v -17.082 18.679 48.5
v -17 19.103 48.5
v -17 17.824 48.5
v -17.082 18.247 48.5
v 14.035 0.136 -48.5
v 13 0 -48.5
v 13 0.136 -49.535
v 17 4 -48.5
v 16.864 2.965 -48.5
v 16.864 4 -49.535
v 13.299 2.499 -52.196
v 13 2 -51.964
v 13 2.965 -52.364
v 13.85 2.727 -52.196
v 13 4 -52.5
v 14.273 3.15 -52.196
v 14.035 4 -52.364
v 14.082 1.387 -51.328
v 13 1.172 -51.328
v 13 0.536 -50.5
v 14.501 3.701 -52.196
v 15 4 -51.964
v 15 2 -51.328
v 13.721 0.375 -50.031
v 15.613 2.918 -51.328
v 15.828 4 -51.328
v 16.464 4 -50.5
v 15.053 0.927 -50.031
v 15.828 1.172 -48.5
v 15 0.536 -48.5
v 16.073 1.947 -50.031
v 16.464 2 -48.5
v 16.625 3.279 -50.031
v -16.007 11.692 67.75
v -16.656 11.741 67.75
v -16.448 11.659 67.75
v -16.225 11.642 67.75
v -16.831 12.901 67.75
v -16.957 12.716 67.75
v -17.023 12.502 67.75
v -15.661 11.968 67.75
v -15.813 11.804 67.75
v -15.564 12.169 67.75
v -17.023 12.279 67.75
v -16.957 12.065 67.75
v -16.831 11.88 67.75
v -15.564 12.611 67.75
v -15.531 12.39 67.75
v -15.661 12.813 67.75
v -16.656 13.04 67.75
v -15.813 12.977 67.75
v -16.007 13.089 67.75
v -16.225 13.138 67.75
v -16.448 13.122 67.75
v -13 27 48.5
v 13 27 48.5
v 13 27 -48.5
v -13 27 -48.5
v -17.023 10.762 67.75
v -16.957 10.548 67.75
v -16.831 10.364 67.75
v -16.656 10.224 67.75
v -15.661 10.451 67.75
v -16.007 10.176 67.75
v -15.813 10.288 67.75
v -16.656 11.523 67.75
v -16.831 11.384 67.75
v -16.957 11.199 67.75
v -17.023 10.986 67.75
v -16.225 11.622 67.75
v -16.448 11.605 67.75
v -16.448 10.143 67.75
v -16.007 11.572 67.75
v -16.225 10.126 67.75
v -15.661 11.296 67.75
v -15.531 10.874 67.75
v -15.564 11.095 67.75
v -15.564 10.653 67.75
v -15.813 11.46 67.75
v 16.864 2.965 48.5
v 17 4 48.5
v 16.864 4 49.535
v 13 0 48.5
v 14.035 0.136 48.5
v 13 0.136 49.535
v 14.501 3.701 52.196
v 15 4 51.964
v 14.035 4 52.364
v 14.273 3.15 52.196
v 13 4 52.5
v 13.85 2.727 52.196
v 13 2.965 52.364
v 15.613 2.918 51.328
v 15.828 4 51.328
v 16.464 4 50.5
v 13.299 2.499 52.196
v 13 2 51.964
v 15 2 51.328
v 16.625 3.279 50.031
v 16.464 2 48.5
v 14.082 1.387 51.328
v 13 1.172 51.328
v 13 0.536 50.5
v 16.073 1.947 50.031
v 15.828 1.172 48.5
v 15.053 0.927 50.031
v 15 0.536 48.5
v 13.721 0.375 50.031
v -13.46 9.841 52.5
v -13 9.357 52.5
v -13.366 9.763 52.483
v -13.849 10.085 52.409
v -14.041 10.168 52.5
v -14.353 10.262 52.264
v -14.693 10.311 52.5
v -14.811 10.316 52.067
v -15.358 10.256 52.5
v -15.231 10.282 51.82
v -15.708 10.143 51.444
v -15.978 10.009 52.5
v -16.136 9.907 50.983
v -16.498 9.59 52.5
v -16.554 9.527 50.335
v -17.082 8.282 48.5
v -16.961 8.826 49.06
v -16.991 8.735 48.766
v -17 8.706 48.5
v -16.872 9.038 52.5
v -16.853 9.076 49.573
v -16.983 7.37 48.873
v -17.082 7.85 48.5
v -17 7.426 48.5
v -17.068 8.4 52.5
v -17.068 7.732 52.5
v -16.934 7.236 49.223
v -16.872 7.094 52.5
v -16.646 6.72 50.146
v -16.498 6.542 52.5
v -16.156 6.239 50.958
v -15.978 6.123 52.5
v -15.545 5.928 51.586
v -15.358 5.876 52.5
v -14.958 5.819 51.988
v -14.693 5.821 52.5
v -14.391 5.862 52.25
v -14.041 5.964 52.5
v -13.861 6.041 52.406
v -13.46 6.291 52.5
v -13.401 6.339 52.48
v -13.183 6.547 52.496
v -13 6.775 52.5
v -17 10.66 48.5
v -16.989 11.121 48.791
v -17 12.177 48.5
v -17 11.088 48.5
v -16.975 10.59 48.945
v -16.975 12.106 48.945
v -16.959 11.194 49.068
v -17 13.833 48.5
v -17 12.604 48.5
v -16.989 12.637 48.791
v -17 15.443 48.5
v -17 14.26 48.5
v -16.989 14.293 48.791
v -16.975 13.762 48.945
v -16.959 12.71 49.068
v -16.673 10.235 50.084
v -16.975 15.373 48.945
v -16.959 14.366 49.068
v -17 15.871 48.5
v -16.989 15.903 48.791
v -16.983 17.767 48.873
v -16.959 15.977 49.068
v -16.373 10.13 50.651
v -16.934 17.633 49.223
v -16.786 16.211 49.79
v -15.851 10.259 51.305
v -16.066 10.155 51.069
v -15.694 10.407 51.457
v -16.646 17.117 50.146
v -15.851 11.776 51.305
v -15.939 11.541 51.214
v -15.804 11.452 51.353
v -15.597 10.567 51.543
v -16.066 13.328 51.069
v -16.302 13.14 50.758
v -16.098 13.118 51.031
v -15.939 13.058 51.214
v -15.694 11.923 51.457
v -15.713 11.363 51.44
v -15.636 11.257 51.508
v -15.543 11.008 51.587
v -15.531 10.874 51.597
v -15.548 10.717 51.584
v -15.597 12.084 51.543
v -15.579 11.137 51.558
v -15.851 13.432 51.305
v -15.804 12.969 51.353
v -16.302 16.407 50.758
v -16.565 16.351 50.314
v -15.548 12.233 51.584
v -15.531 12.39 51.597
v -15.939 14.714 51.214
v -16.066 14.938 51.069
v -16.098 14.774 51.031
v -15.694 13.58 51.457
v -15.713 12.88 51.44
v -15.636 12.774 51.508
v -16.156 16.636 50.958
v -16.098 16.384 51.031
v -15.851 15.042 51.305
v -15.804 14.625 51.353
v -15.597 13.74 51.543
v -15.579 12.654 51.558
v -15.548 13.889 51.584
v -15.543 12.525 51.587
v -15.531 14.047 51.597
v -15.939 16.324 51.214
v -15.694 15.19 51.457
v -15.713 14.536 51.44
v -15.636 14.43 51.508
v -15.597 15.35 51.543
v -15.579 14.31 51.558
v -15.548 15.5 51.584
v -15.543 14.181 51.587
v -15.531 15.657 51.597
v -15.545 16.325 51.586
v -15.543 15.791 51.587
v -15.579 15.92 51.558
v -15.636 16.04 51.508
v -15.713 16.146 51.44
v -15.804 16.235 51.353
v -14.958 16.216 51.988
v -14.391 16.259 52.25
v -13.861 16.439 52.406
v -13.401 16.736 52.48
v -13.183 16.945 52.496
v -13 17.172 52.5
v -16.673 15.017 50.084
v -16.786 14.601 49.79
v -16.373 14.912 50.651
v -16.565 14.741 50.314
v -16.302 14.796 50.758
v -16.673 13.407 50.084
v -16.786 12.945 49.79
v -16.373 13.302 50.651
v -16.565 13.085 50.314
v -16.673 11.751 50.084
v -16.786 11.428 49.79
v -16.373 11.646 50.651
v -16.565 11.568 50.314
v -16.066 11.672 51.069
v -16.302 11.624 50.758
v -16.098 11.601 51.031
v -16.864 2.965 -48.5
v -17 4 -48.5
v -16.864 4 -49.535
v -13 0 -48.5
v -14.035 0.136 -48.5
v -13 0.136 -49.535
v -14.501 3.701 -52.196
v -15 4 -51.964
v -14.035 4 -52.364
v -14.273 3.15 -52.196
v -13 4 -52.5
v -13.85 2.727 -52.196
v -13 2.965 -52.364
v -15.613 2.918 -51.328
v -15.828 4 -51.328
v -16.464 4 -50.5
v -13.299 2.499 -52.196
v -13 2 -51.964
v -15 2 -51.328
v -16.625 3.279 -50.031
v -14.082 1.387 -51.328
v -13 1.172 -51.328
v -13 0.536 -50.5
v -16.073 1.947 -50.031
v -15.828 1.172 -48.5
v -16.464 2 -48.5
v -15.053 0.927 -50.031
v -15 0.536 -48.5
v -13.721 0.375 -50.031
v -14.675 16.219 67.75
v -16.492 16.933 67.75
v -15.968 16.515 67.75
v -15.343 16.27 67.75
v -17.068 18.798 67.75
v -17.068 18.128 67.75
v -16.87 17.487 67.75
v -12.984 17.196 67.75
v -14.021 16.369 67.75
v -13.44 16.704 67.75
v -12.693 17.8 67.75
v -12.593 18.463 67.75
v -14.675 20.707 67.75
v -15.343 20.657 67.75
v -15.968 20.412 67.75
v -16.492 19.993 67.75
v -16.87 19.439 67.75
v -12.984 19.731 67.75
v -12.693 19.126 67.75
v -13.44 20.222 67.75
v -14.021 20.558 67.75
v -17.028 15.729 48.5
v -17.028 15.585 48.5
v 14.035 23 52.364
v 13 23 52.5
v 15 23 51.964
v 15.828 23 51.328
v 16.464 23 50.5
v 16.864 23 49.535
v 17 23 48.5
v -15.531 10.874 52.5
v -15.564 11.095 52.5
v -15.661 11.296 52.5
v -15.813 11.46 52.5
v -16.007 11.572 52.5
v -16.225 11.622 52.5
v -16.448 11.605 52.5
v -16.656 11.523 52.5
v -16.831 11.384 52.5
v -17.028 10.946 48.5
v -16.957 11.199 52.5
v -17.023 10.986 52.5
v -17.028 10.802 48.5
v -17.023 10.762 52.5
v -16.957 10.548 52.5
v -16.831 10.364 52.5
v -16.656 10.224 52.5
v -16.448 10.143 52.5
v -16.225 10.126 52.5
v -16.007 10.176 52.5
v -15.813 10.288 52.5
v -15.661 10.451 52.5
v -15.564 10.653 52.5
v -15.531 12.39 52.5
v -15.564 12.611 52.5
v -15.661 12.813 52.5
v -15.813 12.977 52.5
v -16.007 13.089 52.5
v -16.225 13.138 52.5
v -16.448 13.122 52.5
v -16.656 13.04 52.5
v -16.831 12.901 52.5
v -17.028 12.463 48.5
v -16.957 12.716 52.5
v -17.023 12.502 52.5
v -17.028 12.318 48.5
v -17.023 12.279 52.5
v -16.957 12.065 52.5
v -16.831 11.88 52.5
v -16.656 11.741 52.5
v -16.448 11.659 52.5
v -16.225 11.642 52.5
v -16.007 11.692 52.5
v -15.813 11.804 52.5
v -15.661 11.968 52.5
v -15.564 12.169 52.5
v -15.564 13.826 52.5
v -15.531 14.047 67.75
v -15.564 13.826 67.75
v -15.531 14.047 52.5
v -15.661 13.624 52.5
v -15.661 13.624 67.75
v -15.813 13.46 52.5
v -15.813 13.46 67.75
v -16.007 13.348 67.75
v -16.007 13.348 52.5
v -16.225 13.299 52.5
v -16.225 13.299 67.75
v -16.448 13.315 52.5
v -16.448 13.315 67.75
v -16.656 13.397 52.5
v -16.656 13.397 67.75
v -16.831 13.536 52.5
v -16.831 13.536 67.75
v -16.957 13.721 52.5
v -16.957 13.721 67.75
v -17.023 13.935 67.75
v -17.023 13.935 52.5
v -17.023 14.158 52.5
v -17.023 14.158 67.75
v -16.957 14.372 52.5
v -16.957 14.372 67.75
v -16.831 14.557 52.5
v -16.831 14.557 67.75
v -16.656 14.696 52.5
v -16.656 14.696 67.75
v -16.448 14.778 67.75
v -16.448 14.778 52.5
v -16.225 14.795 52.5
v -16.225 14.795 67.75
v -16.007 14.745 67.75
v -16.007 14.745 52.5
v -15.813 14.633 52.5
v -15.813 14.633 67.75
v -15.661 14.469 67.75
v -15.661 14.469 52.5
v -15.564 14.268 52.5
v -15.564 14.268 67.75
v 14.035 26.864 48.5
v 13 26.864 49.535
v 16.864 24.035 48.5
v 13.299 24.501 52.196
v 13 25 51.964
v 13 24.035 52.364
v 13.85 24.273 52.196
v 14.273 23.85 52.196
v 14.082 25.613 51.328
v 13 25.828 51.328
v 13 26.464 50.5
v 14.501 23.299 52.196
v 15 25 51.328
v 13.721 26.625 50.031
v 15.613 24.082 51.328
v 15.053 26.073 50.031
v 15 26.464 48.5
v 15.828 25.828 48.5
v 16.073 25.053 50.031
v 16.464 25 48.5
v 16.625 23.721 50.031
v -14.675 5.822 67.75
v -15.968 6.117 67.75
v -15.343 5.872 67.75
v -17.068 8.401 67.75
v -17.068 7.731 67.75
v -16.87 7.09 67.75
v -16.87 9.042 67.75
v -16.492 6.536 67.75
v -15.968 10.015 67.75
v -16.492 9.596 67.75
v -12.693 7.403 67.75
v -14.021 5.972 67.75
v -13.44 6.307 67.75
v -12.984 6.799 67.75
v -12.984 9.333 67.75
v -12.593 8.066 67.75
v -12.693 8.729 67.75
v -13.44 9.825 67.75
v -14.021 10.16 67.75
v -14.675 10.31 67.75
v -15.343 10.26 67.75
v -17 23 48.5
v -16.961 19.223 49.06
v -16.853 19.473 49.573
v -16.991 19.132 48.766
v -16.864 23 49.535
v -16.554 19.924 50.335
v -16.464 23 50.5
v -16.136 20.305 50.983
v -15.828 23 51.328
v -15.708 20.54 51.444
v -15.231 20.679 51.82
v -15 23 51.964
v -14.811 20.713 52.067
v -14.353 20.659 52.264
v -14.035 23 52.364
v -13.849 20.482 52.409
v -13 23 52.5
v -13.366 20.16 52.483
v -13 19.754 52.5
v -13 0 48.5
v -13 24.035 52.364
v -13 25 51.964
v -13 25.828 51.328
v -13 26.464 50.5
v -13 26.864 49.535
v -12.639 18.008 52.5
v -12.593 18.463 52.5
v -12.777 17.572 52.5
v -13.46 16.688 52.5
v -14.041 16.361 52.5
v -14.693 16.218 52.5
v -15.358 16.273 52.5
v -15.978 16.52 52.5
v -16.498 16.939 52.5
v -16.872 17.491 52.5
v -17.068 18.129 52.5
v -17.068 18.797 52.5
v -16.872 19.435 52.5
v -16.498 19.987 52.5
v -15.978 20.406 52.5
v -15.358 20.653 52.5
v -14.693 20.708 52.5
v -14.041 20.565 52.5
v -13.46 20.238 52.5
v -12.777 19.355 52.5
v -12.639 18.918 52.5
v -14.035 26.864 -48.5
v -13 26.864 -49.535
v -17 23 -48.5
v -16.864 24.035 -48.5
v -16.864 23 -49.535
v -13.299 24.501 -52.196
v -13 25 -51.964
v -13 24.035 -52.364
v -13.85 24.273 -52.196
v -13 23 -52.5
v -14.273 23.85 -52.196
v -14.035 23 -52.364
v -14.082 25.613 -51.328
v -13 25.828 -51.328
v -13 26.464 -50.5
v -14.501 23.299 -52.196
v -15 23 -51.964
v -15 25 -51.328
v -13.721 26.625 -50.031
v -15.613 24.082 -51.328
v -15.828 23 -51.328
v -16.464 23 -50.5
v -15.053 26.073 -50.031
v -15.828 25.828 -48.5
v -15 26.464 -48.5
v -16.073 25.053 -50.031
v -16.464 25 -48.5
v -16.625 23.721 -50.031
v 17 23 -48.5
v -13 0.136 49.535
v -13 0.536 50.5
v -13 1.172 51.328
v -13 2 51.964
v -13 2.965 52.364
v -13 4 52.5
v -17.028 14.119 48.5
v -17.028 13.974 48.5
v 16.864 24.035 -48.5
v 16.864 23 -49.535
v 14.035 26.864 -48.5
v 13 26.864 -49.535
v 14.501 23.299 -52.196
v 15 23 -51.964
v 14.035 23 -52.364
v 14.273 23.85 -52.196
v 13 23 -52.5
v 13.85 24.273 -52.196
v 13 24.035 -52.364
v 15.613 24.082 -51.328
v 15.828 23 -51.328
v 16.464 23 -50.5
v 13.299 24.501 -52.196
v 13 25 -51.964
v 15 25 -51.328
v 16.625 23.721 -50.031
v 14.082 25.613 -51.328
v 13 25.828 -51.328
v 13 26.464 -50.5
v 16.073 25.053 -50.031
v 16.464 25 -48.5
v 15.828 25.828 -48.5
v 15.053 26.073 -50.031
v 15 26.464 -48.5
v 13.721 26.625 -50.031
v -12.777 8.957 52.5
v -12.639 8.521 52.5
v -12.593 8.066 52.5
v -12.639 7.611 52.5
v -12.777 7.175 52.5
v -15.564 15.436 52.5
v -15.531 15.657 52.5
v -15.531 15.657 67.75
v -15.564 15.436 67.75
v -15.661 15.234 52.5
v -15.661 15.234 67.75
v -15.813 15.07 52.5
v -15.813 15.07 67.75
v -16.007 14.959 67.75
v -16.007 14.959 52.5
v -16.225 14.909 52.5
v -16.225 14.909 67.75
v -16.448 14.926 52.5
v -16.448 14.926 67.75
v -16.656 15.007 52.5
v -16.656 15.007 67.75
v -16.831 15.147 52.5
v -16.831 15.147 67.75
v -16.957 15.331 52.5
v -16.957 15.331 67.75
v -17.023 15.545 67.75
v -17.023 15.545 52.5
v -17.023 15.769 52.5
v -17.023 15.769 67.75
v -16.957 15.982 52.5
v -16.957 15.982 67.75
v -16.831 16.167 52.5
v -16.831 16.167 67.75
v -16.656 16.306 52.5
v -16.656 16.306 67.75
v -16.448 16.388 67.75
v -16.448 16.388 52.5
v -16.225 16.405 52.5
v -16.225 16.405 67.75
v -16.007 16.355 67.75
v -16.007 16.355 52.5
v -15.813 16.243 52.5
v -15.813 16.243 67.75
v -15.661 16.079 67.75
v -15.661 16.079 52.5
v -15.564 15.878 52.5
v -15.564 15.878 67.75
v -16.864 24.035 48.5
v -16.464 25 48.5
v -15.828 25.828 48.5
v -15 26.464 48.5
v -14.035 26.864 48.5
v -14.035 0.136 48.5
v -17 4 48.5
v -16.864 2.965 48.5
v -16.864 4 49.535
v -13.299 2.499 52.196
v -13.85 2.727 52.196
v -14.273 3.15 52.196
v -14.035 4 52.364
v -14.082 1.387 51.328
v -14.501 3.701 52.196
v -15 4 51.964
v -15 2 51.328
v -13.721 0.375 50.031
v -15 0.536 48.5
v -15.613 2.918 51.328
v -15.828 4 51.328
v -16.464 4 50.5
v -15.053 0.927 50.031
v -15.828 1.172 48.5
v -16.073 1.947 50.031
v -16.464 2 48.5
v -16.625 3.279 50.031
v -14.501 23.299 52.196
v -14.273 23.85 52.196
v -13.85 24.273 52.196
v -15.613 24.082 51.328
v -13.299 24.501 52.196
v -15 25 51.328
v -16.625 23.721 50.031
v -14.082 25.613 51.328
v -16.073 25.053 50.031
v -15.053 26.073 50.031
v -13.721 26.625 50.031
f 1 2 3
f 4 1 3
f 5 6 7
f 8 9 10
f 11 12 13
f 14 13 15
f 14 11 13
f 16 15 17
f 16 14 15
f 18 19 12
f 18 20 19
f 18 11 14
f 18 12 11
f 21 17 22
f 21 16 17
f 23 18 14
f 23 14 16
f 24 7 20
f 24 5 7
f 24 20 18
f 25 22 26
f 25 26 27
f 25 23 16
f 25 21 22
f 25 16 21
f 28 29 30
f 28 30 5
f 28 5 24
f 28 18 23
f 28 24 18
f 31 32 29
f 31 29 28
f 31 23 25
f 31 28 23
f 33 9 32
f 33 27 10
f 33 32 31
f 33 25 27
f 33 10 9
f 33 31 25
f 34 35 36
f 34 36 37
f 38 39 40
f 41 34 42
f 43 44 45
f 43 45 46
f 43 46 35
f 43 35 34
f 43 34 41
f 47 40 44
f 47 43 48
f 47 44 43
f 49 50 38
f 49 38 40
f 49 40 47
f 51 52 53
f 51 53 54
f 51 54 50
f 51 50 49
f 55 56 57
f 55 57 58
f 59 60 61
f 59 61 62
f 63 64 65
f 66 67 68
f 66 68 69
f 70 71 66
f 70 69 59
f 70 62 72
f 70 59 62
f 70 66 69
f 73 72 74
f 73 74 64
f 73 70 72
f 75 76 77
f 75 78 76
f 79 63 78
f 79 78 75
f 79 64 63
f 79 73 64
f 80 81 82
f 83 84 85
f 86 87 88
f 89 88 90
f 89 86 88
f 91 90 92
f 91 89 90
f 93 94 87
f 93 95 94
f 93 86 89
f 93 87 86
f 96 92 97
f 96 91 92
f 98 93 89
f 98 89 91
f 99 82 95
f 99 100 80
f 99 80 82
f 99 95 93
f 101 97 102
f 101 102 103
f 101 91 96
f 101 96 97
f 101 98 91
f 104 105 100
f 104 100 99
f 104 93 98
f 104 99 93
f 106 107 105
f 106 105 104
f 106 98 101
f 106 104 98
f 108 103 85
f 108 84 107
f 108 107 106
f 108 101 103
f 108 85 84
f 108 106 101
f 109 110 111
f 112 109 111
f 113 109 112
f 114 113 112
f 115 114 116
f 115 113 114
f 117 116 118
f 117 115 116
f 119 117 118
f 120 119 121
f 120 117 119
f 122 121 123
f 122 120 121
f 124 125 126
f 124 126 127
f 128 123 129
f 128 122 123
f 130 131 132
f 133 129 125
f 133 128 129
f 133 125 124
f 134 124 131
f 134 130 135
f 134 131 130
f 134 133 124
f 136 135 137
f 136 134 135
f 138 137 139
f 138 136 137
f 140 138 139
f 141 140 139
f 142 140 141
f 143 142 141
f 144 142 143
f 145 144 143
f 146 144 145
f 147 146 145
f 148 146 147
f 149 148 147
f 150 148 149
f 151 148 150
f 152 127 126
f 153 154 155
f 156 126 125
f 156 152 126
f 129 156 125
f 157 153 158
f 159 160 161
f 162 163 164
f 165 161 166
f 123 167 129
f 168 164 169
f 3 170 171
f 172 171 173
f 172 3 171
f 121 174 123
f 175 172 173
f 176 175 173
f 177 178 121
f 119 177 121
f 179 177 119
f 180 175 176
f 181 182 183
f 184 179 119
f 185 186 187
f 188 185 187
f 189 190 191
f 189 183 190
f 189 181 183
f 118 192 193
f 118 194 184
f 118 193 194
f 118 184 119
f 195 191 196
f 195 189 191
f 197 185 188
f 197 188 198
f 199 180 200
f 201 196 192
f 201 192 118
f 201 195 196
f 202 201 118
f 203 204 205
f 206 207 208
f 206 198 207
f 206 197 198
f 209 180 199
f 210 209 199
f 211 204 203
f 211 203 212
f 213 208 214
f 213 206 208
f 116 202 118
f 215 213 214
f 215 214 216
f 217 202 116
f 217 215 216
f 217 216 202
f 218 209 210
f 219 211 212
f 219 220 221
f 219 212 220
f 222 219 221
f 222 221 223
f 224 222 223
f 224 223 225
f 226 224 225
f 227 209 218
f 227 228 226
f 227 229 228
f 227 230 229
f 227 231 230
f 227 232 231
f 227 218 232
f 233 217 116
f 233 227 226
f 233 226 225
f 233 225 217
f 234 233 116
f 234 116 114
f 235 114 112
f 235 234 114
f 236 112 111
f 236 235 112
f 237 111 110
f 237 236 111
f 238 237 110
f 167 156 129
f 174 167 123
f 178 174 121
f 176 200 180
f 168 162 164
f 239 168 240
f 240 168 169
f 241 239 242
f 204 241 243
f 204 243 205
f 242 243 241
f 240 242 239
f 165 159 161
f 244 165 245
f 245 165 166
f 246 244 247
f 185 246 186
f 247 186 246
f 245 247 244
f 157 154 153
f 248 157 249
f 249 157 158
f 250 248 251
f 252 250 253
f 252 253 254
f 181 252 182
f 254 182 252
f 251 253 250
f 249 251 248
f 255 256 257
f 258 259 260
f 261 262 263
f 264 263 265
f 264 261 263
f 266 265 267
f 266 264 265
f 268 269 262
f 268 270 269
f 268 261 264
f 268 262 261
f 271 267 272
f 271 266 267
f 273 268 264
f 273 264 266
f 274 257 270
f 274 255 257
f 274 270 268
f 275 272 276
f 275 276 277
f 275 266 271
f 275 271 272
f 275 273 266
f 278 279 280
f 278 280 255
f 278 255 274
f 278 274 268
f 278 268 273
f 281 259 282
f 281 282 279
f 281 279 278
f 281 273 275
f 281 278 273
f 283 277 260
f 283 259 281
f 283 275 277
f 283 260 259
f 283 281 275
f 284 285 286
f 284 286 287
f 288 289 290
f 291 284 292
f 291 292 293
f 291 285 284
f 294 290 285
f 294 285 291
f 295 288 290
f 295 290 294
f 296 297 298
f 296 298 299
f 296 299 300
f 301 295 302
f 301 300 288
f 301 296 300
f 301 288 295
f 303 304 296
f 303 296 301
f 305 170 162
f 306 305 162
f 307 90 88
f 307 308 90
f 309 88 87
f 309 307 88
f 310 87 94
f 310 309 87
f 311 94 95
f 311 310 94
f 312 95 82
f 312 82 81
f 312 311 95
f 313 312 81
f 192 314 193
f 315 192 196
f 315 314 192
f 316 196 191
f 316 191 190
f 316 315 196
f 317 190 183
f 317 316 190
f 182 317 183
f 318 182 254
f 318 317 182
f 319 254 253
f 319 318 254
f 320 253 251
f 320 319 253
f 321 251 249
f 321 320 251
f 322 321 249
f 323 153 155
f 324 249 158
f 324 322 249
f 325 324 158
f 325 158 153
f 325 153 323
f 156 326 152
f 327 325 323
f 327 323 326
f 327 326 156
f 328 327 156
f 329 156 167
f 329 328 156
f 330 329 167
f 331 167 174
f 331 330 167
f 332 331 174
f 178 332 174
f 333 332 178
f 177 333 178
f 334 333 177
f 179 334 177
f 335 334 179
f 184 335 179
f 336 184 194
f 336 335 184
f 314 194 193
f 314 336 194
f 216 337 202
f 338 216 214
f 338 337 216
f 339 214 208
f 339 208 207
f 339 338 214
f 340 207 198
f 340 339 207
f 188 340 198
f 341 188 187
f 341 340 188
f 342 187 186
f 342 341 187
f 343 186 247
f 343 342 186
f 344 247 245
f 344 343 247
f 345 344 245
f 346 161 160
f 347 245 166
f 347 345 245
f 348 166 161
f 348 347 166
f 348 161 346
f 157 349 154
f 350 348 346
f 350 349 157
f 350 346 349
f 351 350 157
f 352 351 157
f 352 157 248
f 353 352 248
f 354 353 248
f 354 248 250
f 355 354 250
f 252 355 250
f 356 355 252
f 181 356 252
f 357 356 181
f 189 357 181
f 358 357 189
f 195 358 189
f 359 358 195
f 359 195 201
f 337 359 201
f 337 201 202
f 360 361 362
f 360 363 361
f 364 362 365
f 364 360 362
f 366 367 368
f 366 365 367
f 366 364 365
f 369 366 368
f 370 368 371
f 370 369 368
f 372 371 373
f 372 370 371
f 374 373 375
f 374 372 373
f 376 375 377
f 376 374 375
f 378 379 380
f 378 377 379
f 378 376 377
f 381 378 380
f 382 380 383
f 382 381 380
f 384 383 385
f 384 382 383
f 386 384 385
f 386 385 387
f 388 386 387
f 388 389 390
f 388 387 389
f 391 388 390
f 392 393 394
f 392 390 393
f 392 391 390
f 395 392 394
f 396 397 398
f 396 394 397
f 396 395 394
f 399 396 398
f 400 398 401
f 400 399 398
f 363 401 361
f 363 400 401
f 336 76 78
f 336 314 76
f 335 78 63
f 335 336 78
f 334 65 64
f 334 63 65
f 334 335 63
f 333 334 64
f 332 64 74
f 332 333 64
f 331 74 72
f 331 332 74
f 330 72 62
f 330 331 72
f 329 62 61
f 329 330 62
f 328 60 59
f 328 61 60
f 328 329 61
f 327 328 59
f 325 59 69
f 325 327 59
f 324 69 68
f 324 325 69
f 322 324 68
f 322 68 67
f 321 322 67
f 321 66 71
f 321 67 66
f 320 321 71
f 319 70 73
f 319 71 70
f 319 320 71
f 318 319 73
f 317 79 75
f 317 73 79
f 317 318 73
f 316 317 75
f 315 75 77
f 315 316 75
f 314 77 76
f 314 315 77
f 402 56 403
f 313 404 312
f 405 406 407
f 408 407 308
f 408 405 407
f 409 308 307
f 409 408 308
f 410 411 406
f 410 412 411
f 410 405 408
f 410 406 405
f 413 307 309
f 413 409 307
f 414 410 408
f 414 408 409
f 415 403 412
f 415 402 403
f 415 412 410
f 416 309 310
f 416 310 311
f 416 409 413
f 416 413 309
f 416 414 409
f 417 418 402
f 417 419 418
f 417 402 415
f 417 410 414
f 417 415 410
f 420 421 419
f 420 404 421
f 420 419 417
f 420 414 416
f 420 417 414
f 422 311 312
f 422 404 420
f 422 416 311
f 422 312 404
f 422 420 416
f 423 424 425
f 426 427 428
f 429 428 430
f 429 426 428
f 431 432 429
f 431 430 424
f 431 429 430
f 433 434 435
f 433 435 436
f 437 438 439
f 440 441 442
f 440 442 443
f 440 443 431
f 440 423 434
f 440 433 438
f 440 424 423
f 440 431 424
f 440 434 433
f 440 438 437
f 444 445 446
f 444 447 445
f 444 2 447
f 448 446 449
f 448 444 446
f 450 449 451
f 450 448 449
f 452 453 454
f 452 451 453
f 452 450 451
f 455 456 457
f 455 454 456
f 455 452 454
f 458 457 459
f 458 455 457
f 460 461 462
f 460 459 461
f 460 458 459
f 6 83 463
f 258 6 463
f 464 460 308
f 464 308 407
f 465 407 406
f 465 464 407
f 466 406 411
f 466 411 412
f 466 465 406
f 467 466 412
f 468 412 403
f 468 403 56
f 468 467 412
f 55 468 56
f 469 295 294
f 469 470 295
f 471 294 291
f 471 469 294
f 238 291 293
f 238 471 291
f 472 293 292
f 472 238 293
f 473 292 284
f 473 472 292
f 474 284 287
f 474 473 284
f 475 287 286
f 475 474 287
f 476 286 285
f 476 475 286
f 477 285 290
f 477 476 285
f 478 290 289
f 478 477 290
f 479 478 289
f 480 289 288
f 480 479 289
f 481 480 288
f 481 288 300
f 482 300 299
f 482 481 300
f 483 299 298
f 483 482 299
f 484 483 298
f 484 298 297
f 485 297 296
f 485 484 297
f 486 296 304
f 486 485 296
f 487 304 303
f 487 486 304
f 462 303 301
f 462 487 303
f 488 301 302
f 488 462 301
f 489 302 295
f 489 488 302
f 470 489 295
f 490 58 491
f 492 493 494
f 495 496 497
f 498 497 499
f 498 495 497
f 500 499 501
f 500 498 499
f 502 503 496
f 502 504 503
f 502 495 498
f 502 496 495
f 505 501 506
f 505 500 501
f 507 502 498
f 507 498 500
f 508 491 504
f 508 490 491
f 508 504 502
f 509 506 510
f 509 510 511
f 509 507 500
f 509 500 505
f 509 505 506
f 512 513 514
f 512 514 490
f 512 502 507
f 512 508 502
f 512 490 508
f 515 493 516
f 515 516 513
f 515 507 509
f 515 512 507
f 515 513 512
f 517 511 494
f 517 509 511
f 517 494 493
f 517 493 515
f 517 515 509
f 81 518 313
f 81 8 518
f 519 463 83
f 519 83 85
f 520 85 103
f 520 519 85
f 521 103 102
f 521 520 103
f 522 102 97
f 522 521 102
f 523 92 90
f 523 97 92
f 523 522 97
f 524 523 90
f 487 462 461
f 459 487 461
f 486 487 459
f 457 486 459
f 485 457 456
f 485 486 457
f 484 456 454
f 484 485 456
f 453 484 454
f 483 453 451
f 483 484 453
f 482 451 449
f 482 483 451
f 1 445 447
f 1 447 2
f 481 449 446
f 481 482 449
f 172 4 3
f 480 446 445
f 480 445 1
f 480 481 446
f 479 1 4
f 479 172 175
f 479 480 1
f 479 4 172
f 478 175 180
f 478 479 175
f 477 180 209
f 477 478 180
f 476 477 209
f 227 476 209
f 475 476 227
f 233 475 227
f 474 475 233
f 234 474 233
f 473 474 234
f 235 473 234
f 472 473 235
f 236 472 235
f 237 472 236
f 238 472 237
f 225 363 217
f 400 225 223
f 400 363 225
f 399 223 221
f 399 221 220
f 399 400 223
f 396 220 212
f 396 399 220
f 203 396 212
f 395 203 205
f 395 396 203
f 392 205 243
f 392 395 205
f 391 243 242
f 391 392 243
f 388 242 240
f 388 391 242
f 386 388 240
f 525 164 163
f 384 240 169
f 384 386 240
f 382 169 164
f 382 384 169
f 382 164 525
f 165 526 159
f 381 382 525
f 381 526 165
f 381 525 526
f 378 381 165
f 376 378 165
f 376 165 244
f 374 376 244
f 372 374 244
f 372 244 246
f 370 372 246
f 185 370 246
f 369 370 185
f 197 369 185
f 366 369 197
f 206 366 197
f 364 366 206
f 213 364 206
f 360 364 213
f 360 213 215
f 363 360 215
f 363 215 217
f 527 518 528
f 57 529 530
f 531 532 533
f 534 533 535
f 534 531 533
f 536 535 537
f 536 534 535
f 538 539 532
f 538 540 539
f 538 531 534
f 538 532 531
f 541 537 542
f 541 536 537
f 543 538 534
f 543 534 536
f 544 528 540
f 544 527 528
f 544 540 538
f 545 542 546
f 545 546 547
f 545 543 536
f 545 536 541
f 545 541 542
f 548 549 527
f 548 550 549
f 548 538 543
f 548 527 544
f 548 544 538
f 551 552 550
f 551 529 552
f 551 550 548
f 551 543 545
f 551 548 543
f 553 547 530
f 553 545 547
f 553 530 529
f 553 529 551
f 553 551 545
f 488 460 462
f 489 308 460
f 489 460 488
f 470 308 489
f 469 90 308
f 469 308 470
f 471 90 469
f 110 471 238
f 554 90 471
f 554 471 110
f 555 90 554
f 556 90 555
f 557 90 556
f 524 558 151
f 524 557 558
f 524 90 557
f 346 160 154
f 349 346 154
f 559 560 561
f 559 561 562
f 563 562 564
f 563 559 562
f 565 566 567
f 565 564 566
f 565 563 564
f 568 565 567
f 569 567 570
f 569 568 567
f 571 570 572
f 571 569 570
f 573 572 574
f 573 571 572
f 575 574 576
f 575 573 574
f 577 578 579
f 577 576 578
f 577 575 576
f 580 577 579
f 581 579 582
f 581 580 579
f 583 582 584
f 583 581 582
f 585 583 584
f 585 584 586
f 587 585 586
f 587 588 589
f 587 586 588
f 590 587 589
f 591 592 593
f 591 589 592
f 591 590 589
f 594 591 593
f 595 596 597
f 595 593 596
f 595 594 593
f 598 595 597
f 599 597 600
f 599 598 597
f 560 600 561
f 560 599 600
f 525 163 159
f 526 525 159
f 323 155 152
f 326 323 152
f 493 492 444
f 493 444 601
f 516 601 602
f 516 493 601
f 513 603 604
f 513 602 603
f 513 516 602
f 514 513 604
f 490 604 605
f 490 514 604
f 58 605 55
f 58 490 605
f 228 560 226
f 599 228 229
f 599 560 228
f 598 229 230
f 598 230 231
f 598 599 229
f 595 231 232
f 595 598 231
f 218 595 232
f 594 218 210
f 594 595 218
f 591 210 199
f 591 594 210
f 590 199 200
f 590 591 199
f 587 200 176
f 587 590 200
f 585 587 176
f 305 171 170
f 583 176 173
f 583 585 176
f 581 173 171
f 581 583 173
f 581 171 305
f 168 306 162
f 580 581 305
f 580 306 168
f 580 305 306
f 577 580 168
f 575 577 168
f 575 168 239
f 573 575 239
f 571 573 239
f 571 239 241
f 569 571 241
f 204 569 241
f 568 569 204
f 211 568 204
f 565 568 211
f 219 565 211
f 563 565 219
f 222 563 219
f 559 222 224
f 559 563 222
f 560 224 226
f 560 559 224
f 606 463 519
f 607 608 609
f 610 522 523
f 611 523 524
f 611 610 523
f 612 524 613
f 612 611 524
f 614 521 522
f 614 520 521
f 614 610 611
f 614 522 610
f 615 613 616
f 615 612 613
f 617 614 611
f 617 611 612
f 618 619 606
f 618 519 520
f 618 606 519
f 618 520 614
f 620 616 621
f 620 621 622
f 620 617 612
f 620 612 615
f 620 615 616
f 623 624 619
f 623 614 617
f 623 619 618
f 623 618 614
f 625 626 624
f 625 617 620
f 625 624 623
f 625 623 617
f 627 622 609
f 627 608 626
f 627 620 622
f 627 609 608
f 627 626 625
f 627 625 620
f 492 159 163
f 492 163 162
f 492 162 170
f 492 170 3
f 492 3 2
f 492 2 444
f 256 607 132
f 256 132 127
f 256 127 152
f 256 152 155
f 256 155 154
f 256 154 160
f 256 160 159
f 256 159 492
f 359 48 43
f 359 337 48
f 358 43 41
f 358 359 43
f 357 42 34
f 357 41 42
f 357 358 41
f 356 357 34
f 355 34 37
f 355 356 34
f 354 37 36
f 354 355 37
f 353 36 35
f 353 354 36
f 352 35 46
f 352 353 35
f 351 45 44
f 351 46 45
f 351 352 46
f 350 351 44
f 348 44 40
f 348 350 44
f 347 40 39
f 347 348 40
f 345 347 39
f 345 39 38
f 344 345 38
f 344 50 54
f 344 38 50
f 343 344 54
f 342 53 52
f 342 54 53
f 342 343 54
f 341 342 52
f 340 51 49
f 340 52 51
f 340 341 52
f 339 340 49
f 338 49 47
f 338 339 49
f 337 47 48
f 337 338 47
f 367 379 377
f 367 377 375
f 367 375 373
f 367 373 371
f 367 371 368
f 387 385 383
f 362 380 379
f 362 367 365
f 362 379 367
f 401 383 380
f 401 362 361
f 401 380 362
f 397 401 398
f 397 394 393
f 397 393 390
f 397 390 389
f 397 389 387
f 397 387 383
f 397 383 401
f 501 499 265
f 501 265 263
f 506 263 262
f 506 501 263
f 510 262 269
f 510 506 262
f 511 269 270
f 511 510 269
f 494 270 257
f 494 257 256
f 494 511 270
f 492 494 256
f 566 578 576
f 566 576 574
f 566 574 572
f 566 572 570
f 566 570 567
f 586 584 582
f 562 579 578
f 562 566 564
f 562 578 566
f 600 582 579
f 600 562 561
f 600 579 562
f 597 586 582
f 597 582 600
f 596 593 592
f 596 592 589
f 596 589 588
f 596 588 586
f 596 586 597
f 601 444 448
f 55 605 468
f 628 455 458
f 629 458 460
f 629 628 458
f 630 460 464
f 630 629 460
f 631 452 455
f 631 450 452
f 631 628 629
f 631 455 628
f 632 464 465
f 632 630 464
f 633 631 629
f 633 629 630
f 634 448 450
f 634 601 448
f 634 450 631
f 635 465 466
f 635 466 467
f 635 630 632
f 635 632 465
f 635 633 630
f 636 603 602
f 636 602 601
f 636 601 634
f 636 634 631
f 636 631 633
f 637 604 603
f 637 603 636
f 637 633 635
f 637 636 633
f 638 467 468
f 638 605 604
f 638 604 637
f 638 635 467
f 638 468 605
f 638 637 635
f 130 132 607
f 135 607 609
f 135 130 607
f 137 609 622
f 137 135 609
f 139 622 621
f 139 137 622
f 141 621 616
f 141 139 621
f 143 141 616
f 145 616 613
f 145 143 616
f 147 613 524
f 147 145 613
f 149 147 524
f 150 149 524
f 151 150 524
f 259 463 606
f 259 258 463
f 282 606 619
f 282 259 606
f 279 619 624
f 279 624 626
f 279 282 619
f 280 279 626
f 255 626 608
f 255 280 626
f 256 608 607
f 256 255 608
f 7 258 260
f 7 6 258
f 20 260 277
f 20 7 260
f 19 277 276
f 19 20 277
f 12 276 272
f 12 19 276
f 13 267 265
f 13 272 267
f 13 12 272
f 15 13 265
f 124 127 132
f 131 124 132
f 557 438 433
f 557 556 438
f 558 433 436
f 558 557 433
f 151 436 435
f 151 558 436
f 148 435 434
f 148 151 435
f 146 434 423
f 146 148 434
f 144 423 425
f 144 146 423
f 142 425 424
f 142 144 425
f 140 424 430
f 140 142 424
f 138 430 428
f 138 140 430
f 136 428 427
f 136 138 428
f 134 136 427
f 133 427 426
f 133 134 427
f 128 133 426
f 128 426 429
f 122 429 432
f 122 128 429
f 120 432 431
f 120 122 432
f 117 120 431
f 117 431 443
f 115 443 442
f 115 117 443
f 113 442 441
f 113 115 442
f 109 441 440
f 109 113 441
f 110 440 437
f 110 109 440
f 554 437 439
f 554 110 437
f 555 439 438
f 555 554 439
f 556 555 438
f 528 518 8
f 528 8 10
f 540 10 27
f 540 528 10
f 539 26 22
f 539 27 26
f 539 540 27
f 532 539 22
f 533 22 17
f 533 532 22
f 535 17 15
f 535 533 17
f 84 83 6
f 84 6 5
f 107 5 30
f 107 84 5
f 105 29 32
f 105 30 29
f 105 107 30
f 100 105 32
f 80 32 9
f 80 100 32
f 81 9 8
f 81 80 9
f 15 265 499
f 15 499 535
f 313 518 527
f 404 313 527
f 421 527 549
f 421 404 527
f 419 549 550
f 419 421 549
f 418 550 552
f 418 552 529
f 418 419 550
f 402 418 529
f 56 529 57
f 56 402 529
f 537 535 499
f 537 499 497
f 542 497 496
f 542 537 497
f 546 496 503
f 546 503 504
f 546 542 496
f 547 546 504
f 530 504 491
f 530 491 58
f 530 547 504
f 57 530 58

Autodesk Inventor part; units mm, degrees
ref_plane "YZ Plane" through (0, 0, 0) normal (1, 0, 0) x (0, 1, 0)
ref_plane "XZ Plane" through (0, 0, 0) normal (0, 1, 0) x (-1, 0, 0)
ref_plane "XY Plane" through (0, 0, 0) normal (0, 0, 1) x (1, 0, 0)
sketch "Эскиз1" plane through (0, 0, 0) normal (0, 1, 0) x (-1, 0, 0)
  line L0 (17, -52.5) -> (-17, -52.5)
  line L1 (-17, -52.5) -> (-17, 52.5)
  line L2 (-17, 52.5) -> (17, 52.5)
  line L3 (17, 52.5) -> (17, -52.5)
  line L4 (17, -52.5) -> (-17, 52.5) construction
  line L5 (-17, -52.5) -> (17, 52.5) construction
  point P0 (0, 0)
  dimension "d0" = 105
  dimension "d1" = 34
extrude "Выдавливание1" add sketch "Эскиз1" along normal blind 27
fillet "Сопряжение1" radius 4 12 edges at (17, 0, 0) (-17, 0, 0) (-17, 27, 0) (17, 27, 0) (0, 27, 52.5) (17, 13.5, 52.5) (0, 0, 52.5) (-17, 13.5, 52.5) (17, 13.5, -52.5) (0, 0, -52.5) (-17, 13.5, -52.5) (0, 27, -52.5)
sketch "Эскиз2" plane through (-13, 4, 52.5) normal (0, 0, 1) x (1, 0, 0)
  line L0 (26, 23) -> (0, 23) projected
  circle A0 centre (-1.8428, 14.4631) radius 2.25
  circle A1 centre (-1.8428, 4.066) radius 2.25
  circle A2 centre (-3.2811, 6.8739) radius 0.75
  circle A3 centre (-3.2811, 8.3904) radius 0.75
  circle A4 centre (-3.2811, 10.0466) radius 0.75
  circle A5 centre (-3.2811, 11.6568) radius 0.75
  point P0 (13, -4)
  dimension "d5" = 4.5
  dimension "d6" = 4.5
  dimension "d7" = 1.5
  dimension "d8" = 1.5
  dimension "d9" = 1.5
  dimension "d10" = 1.5
extrude "Выдавливание2" add sketch "Эскиз2" along normal blind 15.25 and the other way blind 4
properties part number "Аккамулятор" material "Пластик ПАЭК"
